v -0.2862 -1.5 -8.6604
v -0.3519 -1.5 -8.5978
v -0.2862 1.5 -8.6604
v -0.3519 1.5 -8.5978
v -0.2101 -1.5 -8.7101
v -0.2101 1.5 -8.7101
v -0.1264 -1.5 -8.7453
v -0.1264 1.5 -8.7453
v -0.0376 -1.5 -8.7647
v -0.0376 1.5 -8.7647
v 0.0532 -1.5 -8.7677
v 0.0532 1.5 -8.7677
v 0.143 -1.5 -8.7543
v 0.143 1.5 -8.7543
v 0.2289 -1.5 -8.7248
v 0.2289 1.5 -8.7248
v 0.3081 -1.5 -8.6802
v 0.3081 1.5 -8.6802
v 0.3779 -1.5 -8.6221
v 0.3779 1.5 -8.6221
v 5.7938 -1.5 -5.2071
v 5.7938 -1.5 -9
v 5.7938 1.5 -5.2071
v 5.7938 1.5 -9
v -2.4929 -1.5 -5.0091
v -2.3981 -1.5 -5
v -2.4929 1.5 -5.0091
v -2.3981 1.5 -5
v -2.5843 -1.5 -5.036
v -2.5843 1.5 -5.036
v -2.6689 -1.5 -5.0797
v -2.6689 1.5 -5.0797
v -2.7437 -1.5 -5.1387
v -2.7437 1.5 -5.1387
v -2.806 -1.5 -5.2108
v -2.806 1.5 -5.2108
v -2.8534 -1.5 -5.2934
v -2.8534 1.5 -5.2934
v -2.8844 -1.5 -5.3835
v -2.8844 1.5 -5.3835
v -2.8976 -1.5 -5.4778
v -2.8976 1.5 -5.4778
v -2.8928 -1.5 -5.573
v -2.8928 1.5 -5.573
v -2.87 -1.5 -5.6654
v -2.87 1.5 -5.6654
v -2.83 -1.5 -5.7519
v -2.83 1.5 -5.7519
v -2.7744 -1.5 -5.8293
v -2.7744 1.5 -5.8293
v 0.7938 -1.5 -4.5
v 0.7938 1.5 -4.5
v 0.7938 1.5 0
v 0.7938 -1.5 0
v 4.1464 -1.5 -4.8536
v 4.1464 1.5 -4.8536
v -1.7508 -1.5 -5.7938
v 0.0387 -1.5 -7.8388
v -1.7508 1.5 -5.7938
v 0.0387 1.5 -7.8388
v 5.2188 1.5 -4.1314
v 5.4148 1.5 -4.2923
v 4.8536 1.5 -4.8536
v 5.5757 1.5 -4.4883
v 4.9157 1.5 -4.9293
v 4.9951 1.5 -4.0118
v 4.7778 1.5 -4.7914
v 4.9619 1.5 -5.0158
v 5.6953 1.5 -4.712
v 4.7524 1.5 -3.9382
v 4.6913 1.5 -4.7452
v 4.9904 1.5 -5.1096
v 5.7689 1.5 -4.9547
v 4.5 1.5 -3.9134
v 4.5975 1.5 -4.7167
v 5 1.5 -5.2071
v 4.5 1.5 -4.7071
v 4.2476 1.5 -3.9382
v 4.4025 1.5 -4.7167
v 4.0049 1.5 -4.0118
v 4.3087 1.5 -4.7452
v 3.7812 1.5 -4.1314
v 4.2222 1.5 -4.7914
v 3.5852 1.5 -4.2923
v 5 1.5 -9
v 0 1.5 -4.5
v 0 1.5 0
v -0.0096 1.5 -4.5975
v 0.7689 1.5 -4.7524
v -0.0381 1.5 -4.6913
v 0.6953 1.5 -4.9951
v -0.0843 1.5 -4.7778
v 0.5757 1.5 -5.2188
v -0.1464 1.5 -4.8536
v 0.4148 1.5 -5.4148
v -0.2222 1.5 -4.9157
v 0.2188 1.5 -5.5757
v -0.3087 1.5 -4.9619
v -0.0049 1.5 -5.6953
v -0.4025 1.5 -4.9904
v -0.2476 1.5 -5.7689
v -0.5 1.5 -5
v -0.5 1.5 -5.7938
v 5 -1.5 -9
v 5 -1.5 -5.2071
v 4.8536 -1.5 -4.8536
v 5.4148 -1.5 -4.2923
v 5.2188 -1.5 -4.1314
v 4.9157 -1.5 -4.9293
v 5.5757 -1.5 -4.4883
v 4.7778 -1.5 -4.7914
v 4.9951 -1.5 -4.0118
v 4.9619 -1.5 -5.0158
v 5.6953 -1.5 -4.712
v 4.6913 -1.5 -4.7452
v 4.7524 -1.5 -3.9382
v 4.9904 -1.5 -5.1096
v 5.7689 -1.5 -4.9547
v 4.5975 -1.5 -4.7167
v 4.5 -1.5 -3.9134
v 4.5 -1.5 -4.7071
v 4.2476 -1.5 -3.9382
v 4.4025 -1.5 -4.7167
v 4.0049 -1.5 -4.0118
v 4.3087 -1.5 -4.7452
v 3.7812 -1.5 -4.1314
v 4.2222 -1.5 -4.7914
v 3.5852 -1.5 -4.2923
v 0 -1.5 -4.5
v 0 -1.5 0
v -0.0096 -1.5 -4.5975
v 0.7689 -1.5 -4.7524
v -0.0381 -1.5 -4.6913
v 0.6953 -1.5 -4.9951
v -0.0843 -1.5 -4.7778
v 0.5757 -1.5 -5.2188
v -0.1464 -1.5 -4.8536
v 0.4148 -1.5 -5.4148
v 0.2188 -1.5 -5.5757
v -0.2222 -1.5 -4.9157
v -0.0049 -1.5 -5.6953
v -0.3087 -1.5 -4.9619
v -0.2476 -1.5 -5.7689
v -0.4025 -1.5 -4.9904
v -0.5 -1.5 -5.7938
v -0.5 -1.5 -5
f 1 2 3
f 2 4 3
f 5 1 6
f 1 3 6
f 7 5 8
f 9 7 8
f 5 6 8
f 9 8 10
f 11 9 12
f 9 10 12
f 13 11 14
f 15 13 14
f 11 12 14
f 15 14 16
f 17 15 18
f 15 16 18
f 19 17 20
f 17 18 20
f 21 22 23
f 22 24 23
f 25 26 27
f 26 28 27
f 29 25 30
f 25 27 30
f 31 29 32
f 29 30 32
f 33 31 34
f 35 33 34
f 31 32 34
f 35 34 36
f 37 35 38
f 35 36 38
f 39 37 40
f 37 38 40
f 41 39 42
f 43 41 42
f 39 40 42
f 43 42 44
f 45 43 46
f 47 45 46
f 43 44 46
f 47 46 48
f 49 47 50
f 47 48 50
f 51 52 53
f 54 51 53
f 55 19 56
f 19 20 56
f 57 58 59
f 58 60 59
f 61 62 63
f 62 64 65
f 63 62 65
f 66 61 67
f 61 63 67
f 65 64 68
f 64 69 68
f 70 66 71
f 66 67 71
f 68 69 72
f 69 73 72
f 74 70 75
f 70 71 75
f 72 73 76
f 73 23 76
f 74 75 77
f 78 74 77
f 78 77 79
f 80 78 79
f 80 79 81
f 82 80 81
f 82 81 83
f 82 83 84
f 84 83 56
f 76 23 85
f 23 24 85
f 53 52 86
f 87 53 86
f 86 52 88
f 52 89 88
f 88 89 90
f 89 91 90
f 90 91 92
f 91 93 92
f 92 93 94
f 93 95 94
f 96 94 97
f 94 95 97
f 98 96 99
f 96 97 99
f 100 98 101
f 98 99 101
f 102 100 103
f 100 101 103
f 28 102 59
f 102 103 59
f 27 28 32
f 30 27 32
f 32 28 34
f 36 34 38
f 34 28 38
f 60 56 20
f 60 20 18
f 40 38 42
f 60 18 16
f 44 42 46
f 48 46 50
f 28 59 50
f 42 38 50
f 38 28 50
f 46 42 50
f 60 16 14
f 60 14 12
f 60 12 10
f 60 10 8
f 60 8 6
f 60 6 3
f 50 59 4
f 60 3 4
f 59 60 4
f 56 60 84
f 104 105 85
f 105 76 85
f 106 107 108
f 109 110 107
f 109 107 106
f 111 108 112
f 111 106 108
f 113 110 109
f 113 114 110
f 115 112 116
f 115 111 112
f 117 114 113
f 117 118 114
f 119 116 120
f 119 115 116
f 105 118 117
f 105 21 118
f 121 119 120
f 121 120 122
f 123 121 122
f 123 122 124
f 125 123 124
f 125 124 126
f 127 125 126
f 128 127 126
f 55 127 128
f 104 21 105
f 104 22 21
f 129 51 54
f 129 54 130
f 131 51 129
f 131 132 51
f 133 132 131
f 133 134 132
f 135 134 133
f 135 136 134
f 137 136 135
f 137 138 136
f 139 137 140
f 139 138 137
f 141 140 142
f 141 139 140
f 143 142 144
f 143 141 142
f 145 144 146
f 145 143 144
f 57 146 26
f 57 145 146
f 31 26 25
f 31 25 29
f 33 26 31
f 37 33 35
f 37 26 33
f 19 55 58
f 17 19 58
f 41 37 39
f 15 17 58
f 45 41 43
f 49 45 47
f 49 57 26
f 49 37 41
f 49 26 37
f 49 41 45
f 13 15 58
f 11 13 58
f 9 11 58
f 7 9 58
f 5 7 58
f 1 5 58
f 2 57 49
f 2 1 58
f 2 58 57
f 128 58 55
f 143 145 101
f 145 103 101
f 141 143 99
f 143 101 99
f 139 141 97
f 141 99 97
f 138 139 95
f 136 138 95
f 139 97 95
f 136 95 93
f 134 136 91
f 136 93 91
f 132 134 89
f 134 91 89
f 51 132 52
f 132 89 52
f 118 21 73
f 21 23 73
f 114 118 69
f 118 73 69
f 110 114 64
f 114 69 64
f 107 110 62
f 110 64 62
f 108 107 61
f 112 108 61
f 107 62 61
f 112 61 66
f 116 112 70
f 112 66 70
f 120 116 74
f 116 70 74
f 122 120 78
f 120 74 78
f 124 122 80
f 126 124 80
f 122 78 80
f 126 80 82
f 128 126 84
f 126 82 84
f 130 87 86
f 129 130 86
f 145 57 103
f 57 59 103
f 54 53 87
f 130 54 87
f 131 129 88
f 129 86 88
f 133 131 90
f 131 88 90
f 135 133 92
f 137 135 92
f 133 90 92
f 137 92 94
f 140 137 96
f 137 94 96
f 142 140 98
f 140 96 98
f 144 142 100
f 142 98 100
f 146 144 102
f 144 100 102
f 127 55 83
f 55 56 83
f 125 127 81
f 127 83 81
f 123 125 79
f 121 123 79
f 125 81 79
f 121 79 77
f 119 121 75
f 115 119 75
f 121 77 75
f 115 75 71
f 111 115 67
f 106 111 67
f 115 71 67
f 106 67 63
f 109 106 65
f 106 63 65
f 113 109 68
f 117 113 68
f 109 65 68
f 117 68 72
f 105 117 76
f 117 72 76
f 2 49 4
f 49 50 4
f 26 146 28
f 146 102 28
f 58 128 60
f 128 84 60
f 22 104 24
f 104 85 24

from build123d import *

# Parameters (mm, degrees)
BOSS_EXTRUDE2_DEPTH = 1.5


with BuildPart() as part:
    # Sketch8 → Boss-Extrude2 (new, symmetric)
    with BuildSketch(Plane(origin=(0, 0, 0), x_dir=(1, 0, 0), z_dir=(0, 1, 0))):
        with BuildLine():
            Line((0, 0), (0, 4.5))
            ThreePointArc((0, 4.5), (-0.146446609, 4.853553391), (-0.5, 5))
            Line((-0.5, 5), (-2.398115887, 5))
            ThreePointArc((-2.398115887, 5), (-2.853432344, 5.293391859), (-2.774404234, 5.829252304))
            Line((-2.774404234, 5.829252304), (-0.351933318, 8.597790494))
            ThreePointArc((-0.351933318, 8.597790494), (0.007716061, 8.768261258), (0.37790842, 8.62209158))
            Line((0.37790842, 8.62209158), (4.146446609, 4.853553391))
            ThreePointArc((4.146446609, 4.853553391), (4.691341716, 4.745167015), (5, 5.207106781))
            Line((5, 5.207106781), (5, 9))
            Line((5, 9), (5.79375, 9))
            Line((5.79375, 9), (5.79375, 5.207106781))
            ThreePointArc((5.79375, 5.207106781), (4.995096691, 4.011837636), (3.585180602, 4.292287383))
            Line((3.585180602, 4.292287383), (0.038663609, 7.838804376))
            Line((0.038663609, 7.838804376), (-1.75075897, 5.79375))
            Line((-1.75075897, 5.79375), (-0.5, 5.79375))
            ThreePointArc((-0.5, 5.79375), (0.414819398, 5.414819398), (0.79375, 4.5))
            Line((0.79375, 4.5), (0.79375, 0))
            Line((0.79375, 0), (0, 0))
        make_face()
    extrude(amount=BOSS_EXTRUDE2_DEPTH, both=True)


solid = part.part
